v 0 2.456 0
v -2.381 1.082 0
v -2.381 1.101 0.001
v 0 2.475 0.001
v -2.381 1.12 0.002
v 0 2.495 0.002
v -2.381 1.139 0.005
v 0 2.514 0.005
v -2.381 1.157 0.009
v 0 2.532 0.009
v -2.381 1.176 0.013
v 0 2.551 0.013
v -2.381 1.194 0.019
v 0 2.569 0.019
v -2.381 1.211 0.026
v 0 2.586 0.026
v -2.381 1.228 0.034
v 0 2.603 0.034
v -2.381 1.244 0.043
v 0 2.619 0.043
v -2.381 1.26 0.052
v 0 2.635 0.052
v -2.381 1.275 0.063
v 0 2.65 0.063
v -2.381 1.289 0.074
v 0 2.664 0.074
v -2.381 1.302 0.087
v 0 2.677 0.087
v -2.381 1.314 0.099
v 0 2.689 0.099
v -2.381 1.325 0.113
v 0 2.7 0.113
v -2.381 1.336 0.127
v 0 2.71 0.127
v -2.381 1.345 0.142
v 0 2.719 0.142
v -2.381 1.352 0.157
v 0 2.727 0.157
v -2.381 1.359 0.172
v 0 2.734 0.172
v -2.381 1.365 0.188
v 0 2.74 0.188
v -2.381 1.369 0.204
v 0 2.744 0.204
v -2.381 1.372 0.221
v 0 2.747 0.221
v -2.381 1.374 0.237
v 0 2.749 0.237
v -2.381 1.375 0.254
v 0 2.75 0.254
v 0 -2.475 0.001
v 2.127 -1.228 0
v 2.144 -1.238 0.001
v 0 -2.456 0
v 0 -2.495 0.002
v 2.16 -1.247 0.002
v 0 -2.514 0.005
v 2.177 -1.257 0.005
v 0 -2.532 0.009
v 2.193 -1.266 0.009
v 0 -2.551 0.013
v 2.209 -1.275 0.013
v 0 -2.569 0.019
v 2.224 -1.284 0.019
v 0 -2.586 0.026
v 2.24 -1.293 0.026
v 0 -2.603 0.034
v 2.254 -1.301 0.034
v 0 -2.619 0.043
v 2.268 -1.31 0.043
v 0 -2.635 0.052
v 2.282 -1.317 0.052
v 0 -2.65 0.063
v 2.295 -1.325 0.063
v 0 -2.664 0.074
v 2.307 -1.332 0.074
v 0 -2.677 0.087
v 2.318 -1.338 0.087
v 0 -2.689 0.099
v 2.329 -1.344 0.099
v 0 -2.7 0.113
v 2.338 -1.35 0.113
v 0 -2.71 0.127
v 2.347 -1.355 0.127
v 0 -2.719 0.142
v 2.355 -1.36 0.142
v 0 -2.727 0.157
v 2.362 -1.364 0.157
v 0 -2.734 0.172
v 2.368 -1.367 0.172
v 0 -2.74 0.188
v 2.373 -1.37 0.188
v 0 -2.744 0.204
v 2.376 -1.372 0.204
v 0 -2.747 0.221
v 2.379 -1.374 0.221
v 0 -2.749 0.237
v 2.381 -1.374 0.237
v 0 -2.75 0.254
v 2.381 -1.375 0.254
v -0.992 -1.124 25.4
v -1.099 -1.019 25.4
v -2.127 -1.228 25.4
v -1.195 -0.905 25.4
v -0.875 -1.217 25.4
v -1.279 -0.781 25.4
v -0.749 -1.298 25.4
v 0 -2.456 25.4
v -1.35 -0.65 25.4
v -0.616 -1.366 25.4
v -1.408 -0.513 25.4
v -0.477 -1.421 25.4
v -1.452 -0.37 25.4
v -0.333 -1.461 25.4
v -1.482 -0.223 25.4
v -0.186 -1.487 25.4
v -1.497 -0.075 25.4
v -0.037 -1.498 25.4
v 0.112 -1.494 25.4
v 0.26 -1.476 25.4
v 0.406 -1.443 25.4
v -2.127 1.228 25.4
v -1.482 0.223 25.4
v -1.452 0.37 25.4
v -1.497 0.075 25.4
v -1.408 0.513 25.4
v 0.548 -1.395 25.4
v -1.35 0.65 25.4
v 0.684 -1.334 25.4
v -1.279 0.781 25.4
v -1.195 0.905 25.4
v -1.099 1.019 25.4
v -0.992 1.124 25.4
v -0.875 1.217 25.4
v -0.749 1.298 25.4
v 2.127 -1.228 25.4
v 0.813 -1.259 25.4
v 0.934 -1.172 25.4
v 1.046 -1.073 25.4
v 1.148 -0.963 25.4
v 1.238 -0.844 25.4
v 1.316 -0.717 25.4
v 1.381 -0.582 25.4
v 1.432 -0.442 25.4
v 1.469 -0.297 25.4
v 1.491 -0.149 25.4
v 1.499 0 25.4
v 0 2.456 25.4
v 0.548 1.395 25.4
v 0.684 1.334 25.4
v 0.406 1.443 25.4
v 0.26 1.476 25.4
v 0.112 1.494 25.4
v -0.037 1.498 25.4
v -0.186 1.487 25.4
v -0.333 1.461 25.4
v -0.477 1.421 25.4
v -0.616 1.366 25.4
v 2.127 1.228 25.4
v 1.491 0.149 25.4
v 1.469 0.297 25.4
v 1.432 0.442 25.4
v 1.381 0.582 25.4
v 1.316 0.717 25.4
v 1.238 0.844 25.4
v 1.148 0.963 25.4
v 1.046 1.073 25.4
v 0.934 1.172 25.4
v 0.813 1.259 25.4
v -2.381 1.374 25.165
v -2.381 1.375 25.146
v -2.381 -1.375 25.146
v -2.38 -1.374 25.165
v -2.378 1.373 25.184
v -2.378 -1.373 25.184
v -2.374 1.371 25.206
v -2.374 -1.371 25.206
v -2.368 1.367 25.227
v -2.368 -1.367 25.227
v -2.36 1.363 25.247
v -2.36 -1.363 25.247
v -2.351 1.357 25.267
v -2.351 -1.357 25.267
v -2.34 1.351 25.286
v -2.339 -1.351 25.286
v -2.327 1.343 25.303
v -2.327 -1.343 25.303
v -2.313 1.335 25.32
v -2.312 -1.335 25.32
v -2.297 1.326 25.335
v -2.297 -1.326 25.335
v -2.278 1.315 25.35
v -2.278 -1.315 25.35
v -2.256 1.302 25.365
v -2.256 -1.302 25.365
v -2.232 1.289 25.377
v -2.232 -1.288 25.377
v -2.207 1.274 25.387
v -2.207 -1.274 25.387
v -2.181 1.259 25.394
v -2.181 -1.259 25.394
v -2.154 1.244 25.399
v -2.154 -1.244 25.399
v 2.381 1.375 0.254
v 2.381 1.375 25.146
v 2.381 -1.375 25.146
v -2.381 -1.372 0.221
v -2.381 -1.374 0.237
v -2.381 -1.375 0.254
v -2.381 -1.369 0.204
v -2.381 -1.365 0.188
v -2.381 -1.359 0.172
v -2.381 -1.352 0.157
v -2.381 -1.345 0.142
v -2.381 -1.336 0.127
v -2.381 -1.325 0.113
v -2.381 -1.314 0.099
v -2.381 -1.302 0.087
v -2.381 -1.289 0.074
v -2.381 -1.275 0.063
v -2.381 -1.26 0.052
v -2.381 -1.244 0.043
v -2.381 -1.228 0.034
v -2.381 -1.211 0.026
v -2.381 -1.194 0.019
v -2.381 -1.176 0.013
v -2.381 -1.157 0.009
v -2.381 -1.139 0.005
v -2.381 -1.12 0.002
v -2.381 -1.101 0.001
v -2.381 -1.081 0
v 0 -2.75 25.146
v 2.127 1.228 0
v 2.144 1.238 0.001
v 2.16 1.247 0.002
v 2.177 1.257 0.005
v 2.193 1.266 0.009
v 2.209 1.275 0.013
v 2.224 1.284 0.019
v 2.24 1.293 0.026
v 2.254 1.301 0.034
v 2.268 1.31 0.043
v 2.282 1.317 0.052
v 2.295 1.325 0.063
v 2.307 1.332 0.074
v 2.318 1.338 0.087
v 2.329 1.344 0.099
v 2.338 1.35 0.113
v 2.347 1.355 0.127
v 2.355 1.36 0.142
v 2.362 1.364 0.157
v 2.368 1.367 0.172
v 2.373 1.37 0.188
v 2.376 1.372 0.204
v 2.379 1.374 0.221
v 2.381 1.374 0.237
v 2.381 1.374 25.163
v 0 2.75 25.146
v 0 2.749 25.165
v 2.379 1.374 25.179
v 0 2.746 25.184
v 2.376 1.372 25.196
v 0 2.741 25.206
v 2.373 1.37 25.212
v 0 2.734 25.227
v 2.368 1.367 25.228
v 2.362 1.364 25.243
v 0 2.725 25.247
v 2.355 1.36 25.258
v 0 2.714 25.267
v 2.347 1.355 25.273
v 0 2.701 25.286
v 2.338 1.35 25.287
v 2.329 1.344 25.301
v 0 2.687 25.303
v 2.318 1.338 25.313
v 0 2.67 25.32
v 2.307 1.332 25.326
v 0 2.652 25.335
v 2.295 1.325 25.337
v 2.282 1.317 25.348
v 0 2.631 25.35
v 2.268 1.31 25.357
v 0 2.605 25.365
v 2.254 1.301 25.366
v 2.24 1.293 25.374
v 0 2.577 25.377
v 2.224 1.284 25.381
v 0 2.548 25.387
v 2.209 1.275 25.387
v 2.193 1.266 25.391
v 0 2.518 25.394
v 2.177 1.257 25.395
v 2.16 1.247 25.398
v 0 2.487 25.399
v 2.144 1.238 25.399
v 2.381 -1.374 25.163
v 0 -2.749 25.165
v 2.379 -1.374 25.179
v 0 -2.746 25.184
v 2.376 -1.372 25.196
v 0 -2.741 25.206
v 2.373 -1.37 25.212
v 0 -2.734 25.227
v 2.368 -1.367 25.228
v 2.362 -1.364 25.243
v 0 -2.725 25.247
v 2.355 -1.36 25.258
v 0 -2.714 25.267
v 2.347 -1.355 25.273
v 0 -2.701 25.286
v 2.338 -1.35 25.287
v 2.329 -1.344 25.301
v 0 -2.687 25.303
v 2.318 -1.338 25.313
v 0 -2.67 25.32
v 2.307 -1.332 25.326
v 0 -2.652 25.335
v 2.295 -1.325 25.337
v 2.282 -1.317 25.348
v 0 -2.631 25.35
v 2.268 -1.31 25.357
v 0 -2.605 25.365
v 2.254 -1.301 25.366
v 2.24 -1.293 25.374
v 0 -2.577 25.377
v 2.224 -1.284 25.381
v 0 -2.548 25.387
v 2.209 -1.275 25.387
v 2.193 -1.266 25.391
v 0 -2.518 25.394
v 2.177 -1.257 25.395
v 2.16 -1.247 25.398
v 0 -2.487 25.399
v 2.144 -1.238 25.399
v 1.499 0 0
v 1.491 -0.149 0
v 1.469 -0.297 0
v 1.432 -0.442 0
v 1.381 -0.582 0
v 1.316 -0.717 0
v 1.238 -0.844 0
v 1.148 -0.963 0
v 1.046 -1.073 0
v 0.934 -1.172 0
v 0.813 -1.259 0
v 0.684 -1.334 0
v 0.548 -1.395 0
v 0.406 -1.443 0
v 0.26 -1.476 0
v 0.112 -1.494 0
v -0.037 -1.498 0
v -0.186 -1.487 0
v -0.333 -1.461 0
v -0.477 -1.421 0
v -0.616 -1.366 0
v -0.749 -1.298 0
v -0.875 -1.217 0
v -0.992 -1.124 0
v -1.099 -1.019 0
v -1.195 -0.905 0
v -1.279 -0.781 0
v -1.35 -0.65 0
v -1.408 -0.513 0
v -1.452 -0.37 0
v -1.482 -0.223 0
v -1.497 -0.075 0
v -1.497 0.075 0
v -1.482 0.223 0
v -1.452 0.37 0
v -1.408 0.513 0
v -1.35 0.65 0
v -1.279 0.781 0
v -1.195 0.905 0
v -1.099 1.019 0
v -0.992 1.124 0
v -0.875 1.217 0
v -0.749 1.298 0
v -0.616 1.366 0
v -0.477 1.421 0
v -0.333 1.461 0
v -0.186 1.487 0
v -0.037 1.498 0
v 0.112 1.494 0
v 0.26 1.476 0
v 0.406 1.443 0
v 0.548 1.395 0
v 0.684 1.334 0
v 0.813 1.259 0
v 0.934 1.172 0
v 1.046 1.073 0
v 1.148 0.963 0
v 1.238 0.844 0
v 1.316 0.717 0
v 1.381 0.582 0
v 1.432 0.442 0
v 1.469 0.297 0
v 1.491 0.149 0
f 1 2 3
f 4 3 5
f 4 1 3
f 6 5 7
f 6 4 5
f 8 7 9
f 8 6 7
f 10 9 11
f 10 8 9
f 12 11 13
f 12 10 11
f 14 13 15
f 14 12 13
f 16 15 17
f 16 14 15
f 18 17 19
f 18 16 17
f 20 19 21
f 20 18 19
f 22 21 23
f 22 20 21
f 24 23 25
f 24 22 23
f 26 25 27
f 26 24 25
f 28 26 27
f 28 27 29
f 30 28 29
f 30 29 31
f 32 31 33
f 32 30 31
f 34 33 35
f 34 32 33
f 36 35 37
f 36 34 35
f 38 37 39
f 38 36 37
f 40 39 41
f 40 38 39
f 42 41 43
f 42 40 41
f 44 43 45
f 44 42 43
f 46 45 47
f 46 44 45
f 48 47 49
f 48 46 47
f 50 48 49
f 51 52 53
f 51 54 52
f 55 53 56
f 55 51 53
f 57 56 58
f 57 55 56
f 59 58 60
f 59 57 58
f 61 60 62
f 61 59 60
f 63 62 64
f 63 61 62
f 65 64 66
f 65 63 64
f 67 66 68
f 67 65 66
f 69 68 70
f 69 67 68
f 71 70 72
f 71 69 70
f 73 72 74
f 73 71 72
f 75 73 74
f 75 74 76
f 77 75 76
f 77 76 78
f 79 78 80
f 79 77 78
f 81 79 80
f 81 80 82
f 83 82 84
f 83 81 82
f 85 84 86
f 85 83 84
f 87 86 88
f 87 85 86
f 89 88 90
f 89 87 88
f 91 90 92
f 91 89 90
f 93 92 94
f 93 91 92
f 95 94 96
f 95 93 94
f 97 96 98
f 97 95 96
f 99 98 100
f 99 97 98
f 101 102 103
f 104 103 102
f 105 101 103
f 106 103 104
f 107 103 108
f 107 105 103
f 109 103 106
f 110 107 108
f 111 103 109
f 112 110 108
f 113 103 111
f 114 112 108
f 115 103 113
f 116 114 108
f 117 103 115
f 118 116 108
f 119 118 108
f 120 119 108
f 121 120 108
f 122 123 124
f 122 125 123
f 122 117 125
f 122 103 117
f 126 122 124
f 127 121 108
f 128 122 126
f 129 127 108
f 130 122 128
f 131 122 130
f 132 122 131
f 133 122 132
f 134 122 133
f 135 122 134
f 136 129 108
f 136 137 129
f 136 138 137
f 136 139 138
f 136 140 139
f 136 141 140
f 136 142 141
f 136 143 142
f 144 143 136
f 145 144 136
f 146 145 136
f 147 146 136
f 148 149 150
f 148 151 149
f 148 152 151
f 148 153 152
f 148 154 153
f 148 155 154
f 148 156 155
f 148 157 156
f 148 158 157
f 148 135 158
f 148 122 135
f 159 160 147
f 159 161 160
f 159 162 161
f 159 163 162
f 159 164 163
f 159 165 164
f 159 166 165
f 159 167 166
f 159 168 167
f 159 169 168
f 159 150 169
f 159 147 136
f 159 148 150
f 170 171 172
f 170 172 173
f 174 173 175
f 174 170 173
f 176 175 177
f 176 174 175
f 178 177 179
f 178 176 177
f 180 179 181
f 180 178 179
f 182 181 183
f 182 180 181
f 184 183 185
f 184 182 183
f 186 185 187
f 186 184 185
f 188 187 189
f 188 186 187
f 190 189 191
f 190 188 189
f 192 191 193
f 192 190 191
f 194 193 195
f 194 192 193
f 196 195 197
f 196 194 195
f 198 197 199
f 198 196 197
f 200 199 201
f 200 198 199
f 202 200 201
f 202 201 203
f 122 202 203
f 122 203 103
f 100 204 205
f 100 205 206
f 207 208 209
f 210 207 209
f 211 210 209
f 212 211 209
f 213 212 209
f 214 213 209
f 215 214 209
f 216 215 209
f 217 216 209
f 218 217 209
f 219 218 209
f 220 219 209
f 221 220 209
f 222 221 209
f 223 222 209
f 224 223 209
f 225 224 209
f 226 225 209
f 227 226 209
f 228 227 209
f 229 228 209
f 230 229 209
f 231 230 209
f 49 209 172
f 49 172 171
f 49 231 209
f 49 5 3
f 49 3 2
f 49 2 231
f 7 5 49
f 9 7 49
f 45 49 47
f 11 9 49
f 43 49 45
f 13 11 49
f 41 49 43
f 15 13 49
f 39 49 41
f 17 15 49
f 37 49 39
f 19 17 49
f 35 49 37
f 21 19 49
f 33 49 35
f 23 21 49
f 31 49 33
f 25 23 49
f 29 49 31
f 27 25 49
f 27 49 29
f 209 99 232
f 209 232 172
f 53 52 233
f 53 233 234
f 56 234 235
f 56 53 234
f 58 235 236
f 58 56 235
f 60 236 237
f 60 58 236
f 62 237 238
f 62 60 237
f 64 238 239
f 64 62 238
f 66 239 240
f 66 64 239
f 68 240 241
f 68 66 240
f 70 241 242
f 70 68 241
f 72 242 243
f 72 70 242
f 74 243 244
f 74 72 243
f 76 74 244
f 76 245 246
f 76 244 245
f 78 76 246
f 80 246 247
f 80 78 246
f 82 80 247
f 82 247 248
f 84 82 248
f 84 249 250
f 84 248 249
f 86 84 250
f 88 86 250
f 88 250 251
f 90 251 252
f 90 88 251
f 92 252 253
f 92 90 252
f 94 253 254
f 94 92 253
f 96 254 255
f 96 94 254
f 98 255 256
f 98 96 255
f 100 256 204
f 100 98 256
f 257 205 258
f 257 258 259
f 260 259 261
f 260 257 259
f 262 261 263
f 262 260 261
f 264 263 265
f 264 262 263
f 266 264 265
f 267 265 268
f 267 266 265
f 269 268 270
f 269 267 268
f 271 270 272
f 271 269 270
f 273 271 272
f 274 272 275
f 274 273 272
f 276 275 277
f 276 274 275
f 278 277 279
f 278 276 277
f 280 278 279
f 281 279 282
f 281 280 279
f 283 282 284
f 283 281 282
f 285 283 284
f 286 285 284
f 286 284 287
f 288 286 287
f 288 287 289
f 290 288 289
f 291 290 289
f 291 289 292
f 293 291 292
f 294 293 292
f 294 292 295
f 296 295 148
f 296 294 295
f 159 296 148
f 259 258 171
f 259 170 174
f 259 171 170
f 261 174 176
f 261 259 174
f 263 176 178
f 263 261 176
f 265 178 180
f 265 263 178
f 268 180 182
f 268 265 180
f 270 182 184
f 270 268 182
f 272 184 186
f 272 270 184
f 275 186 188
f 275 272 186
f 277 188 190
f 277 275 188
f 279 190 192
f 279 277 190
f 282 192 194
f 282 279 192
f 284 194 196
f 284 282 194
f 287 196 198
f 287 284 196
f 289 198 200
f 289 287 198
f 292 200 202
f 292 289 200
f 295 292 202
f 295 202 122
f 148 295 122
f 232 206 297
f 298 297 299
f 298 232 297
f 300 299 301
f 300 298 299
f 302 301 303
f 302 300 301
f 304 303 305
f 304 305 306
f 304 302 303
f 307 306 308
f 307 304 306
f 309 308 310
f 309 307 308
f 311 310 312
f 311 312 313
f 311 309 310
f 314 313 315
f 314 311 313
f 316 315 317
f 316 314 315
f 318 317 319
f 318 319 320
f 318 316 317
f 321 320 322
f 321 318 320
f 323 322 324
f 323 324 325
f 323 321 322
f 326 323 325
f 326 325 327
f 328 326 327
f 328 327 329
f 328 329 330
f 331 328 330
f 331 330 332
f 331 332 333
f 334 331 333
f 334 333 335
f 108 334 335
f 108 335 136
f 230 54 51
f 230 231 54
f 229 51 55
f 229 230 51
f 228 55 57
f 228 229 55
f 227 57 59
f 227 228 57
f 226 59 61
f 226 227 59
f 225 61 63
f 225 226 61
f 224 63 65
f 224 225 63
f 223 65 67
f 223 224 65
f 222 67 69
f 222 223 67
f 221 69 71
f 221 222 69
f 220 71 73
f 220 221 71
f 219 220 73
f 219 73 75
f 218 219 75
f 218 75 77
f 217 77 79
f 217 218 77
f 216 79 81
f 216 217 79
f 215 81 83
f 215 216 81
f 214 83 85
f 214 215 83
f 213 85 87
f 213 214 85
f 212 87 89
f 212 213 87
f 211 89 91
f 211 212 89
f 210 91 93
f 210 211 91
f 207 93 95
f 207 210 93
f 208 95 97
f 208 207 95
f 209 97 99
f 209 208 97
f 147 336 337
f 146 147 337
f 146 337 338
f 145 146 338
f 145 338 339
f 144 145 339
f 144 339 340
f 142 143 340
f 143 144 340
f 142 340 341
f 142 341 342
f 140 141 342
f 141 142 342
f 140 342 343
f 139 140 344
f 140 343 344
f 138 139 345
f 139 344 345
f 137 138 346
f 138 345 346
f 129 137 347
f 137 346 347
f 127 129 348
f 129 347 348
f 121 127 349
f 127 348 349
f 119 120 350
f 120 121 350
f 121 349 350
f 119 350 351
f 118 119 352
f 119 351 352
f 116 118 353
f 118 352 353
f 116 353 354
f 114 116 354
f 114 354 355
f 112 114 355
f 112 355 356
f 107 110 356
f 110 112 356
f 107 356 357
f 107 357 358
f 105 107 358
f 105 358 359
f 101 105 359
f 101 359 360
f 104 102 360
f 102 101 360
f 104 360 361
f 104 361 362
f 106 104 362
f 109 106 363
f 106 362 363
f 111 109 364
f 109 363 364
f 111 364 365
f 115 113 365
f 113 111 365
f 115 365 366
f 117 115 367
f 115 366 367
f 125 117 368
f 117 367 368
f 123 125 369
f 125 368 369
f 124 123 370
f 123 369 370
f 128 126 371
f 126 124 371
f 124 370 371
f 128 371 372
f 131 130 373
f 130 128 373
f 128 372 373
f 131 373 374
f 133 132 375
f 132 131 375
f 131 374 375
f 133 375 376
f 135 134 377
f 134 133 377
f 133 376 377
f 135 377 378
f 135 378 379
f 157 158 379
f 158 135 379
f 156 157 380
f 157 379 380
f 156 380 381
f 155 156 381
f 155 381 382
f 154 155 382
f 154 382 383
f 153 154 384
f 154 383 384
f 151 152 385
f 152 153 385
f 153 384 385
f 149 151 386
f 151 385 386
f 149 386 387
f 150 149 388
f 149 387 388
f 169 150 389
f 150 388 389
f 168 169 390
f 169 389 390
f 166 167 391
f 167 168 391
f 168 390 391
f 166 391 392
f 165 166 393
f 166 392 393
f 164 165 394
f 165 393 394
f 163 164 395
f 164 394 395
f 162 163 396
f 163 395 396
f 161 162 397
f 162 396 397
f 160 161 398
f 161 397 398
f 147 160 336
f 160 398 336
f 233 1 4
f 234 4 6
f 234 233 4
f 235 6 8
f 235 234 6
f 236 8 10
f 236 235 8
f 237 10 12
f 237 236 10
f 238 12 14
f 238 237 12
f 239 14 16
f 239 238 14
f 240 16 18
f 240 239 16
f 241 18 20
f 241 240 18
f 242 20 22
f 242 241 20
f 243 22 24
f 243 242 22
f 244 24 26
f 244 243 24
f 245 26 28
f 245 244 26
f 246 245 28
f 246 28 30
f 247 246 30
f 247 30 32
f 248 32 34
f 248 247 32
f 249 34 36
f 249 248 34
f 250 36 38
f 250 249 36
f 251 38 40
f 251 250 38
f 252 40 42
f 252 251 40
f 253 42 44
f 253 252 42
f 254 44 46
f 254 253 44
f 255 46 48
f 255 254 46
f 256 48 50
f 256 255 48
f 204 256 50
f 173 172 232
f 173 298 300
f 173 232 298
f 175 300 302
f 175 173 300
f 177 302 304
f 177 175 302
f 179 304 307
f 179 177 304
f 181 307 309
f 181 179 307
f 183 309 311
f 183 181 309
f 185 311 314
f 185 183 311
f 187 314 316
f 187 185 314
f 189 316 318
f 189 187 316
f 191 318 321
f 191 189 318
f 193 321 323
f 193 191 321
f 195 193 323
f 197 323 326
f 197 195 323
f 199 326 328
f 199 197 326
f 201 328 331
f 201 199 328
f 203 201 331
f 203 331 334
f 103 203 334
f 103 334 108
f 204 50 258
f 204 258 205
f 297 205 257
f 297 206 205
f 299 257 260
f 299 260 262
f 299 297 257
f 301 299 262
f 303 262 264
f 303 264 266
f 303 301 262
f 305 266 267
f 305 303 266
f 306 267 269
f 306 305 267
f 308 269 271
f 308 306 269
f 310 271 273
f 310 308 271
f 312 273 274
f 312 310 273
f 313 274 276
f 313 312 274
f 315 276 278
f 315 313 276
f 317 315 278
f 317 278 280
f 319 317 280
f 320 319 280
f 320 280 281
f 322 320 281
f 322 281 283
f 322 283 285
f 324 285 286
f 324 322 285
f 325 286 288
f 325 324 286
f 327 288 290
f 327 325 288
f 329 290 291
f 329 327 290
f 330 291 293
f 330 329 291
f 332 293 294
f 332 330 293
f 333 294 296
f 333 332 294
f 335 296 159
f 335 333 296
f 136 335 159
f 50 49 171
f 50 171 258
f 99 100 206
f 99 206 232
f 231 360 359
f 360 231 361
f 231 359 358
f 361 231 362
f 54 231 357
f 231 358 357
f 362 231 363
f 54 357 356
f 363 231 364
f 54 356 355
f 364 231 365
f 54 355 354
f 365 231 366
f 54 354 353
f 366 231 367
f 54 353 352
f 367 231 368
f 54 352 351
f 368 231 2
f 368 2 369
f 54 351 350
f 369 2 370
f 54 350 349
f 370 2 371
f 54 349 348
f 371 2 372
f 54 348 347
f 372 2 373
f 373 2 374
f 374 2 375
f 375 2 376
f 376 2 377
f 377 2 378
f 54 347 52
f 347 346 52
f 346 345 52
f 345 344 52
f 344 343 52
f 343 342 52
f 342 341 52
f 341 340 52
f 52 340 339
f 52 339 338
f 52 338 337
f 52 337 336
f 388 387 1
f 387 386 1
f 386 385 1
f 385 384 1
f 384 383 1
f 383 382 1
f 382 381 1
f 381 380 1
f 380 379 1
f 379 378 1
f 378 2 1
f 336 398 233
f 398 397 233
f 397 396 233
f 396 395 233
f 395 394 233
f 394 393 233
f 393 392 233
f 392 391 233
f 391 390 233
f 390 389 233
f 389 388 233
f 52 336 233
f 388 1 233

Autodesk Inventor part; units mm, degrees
ref_plane "YZ Plane" through (0, 0, 0) normal (1, 0, 0) x (0, 1, 0)
ref_plane "XZ Plane" through (0, 0, 0) normal (0, 1, 0) x (-1, 0, 0)
ref_plane "XY Plane" through (0, 0, 0) normal (0, 0, 1) x (1, 0, 0)
sketch "Sketch1" plane through (0, 0, 0) normal (0, 0, 1) x (1, 0, 0)
  line L0 (2.3812, -1.3748) -> (0, -2.7496)
  line L1 (0, -2.7496) -> (-2.3812, -1.3748)
  line L2 (-2.3812, -1.3748) -> (-2.3813, 1.3748)
  line L3 (-2.3813, 1.3748) -> (0, 2.7496)
  line L4 (0, 2.7496) -> (2.3812, 1.3748)
  line L5 (2.3812, 1.3748) -> (2.3812, -1.3748)
  circle A0 centre (0, 0) radius 1.4986
  point P0 (2.3812, 0)
  dimension "d1" = 2.9972
extrude "Extrusion1" add sketch "Sketch1" along normal blind 25.4
fillet "Fillet1" radius 0.254 5 edges at (2.3812, 0, 0) (1.1906, -2.0622, 0) (-1.1906, -2.0622, 0) (-1.1906, 2.0622, 0) (1.1906, 2.0622, 0)
fillet "Fillet2" radius 0.254 6 edges at (2.3812, 0, 25.4) (1.1906, 2.0622, 25.4) (-1.1906, 2.0622, 25.4) (-2.3812, 0, 25.4) (-1.1906, -2.0622, 25.4) (1.1906, -2.0622, 25.4)
thread "Thread1" size "5-40 UNC" class "2B" standard "ANSI Unified Screw Threads" full length
properties part number "Stand-Off Posts 1inch"
